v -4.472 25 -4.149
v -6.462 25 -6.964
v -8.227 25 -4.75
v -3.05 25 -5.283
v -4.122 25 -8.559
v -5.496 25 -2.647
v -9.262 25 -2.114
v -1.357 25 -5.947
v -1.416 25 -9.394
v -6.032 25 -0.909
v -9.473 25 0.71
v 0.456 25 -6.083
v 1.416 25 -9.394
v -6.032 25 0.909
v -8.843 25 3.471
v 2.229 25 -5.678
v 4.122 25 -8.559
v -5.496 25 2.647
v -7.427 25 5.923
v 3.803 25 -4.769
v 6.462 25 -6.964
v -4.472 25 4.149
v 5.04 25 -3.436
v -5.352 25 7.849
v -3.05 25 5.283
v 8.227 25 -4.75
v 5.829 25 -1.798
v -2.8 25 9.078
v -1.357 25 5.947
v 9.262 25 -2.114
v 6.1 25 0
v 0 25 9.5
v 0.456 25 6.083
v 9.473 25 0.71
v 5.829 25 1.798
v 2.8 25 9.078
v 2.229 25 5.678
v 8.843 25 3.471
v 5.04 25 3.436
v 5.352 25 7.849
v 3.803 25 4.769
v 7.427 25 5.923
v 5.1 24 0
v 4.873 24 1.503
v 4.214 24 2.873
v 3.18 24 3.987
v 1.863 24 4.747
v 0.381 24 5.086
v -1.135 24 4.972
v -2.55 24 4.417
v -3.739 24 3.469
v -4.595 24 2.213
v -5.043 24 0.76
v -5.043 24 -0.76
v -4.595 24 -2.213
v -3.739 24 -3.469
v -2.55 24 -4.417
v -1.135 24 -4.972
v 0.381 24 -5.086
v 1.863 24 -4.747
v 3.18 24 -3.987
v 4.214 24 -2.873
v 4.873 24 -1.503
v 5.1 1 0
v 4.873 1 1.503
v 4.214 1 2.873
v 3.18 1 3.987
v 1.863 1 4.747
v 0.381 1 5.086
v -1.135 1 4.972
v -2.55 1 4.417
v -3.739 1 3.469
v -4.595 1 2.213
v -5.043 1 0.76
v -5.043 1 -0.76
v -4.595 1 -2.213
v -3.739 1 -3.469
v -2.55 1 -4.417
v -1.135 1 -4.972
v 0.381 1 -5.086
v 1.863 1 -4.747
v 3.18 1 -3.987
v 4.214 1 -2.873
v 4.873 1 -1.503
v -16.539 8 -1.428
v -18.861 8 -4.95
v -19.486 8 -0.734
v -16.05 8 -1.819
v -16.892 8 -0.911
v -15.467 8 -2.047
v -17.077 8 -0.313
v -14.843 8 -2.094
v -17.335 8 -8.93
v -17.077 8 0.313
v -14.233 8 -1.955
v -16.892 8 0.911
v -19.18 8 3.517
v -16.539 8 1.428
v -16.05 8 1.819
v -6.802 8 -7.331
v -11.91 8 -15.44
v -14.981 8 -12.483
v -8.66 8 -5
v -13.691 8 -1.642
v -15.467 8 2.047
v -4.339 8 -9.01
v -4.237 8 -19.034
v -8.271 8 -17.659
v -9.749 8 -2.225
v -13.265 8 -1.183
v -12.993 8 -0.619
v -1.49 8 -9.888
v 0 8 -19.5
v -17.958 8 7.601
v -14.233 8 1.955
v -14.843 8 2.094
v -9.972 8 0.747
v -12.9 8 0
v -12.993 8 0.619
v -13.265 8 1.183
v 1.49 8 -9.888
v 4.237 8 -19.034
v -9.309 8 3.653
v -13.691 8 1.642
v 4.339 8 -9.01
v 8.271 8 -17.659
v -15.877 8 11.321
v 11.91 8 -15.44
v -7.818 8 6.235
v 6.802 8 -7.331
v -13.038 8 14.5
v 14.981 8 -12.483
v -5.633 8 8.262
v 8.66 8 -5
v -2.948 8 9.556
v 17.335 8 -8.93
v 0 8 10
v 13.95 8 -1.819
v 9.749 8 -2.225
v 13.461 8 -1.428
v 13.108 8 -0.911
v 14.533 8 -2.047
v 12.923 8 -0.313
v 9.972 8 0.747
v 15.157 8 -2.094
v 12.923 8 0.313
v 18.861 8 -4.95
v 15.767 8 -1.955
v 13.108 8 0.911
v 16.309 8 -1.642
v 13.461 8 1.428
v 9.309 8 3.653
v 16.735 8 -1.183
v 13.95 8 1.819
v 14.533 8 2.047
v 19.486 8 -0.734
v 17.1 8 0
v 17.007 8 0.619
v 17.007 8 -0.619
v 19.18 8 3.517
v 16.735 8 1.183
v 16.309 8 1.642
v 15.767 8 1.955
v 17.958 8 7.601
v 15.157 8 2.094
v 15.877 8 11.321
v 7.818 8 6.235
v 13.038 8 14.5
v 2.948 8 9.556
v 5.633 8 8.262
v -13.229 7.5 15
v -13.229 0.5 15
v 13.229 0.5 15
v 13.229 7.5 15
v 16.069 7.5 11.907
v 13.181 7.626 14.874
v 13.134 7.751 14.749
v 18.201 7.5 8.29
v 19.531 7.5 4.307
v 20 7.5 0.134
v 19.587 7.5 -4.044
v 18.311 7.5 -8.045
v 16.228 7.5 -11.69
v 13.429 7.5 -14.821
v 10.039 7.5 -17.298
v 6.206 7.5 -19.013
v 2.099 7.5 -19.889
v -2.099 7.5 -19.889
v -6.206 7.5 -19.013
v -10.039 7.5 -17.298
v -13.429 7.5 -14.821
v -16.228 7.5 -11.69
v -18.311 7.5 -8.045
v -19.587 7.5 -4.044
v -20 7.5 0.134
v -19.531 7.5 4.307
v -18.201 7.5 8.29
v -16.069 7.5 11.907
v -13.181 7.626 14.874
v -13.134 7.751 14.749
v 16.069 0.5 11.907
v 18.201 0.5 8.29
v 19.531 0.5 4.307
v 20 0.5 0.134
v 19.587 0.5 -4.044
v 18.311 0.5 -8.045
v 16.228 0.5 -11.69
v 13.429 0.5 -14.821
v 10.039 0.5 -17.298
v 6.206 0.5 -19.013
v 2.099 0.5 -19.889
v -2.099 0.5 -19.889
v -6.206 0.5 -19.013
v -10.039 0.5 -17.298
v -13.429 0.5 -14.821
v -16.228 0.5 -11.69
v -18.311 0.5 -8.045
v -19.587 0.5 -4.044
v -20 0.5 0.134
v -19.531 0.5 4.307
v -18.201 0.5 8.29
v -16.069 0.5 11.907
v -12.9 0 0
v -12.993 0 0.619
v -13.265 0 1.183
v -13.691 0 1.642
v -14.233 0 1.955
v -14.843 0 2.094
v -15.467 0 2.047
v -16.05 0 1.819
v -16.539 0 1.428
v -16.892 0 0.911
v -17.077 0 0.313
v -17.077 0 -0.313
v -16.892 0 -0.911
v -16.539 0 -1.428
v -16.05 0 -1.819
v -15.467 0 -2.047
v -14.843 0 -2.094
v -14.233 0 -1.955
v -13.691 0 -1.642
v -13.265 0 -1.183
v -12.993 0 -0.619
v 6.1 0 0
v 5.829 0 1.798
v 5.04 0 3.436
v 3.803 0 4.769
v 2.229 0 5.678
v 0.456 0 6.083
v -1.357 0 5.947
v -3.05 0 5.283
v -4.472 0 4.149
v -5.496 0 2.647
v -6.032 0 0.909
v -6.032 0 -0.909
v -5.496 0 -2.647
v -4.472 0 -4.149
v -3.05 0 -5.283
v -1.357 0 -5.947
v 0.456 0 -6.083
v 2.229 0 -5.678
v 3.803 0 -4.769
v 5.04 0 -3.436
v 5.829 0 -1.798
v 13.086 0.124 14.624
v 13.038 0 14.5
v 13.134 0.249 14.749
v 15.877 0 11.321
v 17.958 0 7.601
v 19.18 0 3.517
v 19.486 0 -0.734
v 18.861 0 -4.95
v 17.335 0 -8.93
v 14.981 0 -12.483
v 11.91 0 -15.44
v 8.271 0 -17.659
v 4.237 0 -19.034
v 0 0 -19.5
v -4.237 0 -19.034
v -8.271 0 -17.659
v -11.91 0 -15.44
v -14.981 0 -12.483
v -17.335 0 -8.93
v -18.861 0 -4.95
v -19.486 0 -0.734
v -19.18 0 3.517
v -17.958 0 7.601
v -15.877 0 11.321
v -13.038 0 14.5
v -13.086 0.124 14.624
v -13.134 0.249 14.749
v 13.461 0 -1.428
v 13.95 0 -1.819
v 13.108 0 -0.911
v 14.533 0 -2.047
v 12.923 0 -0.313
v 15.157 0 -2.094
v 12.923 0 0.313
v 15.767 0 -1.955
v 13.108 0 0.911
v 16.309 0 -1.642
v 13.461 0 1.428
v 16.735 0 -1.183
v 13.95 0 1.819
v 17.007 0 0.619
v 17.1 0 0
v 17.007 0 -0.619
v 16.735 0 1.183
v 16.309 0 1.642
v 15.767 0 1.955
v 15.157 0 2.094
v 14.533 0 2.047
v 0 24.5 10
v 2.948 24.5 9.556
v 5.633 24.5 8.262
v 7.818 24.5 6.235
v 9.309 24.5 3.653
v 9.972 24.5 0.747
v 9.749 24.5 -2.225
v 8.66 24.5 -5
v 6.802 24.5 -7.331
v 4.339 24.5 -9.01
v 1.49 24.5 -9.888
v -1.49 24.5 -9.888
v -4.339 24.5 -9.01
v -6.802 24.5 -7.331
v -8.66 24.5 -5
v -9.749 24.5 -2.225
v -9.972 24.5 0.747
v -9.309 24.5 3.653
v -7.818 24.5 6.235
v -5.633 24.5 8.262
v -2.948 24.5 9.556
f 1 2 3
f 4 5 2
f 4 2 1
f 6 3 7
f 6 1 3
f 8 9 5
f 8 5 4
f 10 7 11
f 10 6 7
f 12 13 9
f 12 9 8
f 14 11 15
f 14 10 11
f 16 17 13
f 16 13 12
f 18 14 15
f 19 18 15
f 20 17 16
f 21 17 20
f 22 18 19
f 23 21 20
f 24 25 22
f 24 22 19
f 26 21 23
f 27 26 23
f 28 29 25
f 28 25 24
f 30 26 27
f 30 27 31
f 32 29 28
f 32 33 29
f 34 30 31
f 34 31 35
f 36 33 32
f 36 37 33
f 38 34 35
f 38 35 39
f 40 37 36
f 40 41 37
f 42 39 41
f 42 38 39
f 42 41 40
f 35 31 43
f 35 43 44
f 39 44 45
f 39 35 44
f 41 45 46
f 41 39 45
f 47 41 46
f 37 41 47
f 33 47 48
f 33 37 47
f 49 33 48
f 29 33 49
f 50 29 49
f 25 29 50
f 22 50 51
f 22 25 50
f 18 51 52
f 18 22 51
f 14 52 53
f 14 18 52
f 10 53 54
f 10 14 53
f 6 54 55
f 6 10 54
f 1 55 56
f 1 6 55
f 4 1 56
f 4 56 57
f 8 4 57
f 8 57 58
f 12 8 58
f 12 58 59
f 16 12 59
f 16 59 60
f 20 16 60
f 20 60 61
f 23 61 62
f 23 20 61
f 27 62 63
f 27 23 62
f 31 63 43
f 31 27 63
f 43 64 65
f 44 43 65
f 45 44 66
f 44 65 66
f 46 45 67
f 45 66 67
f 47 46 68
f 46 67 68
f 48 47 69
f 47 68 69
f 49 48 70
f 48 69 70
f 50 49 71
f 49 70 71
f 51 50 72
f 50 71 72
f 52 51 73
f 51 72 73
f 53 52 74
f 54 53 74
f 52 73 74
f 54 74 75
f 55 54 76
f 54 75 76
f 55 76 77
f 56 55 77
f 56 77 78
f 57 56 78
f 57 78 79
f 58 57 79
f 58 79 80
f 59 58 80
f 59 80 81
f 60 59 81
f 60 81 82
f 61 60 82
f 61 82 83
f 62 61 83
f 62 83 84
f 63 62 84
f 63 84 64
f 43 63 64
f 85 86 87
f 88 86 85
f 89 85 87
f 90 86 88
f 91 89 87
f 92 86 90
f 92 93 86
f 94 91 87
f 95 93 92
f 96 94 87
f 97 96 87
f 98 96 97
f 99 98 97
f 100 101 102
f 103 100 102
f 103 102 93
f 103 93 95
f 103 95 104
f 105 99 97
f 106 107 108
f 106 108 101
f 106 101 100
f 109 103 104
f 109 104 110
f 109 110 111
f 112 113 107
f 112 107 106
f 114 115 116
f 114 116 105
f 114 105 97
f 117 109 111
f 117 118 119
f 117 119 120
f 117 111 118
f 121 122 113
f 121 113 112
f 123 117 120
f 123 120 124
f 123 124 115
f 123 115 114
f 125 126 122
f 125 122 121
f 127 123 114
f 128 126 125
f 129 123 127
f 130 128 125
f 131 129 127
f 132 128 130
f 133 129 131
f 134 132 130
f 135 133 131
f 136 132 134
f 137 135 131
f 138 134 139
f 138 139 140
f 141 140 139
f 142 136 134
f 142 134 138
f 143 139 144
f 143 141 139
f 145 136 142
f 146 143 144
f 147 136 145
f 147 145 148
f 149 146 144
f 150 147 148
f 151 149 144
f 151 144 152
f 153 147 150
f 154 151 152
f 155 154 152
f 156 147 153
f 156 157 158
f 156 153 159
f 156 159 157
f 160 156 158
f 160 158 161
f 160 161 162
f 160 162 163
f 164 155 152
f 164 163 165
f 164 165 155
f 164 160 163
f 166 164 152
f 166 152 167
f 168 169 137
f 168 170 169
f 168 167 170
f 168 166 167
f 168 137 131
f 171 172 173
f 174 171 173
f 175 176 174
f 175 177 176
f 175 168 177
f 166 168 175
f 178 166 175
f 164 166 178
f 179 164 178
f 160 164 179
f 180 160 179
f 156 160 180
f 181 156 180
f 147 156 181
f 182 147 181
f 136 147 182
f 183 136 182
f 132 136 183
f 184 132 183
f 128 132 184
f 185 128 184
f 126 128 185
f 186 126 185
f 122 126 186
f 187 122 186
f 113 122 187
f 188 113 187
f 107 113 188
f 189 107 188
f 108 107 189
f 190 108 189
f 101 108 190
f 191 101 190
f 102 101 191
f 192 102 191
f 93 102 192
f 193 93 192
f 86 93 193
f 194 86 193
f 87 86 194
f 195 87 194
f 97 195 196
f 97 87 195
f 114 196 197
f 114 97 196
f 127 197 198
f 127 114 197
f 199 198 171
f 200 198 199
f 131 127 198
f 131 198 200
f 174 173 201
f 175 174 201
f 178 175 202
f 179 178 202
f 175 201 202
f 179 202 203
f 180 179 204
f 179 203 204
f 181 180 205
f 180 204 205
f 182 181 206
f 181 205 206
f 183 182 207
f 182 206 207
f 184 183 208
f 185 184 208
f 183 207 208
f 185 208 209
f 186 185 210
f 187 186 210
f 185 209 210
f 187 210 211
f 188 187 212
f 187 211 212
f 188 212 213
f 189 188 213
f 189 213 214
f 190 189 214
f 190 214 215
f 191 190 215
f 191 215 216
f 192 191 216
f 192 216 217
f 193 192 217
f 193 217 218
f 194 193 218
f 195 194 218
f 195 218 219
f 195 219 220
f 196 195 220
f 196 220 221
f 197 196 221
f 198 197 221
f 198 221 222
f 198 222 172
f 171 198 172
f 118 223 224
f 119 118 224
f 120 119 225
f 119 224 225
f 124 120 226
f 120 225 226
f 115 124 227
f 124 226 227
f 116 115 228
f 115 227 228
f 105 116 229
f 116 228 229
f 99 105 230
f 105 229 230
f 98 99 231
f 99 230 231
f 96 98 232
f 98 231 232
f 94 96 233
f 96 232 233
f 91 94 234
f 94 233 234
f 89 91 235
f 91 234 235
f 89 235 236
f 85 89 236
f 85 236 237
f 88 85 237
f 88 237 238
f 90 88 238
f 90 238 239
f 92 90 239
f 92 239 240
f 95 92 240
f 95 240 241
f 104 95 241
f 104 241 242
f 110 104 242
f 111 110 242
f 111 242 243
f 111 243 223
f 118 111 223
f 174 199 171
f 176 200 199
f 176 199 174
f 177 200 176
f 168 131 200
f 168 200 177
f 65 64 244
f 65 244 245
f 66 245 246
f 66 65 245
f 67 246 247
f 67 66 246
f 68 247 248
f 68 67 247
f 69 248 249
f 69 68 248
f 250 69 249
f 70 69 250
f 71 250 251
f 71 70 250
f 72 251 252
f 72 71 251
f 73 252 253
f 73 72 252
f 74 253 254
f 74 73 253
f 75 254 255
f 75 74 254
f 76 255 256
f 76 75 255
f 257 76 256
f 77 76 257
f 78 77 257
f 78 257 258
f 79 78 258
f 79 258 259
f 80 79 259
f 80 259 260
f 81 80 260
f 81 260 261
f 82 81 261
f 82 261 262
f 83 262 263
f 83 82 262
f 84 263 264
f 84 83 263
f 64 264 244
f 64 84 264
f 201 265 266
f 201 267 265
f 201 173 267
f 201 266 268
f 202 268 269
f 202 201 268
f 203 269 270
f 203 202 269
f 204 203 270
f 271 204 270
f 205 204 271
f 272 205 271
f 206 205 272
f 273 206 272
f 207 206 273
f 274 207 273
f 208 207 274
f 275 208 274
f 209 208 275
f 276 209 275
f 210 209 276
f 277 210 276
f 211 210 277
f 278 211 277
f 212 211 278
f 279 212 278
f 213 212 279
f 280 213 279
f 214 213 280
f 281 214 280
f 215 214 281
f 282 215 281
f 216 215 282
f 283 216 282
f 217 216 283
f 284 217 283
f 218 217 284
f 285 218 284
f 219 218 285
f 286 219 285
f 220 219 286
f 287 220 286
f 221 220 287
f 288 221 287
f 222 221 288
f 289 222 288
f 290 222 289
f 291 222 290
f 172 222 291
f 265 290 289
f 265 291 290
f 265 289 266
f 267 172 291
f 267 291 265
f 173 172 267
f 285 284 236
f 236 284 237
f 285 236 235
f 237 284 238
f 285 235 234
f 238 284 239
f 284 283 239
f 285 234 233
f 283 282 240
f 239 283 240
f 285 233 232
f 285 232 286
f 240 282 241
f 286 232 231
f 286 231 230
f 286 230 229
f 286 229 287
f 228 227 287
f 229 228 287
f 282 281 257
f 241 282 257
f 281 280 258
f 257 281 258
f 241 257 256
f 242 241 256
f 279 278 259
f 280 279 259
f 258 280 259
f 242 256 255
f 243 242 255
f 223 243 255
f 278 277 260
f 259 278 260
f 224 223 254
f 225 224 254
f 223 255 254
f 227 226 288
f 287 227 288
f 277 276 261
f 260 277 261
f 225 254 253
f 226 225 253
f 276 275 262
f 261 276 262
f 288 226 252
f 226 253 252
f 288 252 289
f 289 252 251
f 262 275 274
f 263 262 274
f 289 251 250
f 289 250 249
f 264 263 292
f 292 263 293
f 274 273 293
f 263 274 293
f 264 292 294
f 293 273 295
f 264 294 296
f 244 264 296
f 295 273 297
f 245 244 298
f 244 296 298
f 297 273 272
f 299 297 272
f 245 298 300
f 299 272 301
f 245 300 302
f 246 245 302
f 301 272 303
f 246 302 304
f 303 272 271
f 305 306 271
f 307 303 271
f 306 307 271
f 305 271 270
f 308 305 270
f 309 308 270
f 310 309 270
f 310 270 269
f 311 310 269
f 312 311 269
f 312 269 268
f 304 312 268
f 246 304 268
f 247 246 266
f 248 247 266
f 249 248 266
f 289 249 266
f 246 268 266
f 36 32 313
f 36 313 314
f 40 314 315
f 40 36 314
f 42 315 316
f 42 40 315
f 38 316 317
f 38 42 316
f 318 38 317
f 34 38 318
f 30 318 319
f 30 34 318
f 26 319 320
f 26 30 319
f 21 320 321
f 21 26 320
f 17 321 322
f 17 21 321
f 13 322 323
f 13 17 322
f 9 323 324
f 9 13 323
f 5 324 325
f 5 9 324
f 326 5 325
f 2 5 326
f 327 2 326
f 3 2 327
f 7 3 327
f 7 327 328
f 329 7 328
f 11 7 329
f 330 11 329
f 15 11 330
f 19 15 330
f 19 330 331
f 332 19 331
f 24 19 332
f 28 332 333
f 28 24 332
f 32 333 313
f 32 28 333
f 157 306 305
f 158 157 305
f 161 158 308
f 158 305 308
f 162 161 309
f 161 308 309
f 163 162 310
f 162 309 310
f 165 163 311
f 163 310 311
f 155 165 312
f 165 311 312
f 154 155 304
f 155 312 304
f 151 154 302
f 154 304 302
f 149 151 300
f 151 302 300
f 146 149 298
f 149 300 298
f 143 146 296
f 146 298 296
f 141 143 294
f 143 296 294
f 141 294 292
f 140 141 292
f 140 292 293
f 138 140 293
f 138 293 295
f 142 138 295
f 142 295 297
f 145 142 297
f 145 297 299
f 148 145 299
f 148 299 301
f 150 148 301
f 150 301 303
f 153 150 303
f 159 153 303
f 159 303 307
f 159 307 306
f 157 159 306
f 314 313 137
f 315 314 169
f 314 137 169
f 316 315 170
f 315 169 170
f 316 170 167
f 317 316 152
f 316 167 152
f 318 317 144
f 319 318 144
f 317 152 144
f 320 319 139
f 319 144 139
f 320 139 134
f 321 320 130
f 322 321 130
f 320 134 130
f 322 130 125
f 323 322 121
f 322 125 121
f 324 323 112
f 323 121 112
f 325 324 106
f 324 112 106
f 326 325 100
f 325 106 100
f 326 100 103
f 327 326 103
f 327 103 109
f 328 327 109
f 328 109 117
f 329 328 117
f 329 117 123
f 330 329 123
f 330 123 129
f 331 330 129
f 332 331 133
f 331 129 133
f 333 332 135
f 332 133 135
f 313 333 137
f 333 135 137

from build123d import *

# Parameters (mm, degrees)
SKETCH1_R           = 20
BOSS_EXTRUDE1_DEPTH = 8
SKETCH2_R           = 10
BOSS_EXTRUDE2_DEPTH = 17
M12_TAPPED_HOLE1_D  = 10.2
CHAMFER1_SIZE       = 1
M5_TAPPED_HOLE1_D   = 4.2
CUT_EXTRUDE1_REACH  = 39.749
SKETCH7_W           = 49.327328333
SKETCH7_H           = 13.526029649
CHAMFER2_SIZE       = 0.5


with BuildPart() as part:
    # Sketch1 → Boss-Extrude1 (new body)
    with BuildSketch(Plane(origin=(0, 0, 0), x_dir=(1, 0, 0), z_dir=(0, 1, 0))):
        with Locations(Location((0, 0, 0), (0, 0, 270))):
            Circle(SKETCH1_R)
    extrude(amount=BOSS_EXTRUDE1_DEPTH)

    # Sketch2 → Boss-Extrude2 (add)
    with BuildSketch(Plane(origin=(0, 8, 0), x_dir=(1, 0, 0), z_dir=(0, 1, 0))):
        with Locations(Location((0, 0, 0), (0, 0, 270))):
            Circle(SKETCH2_R)
    extrude(amount=BOSS_EXTRUDE2_DEPTH)

    # M12 Tapped Hole1 (through all)
    with Locations(Plane(origin=(0, 25, 0), x_dir=(-1, 0, 0), z_dir=(0, 1, 0))):
        with Locations((0, 0)):
            Hole(M12_TAPPED_HOLE1_D / 2)

    # Chamfer1
    chamfer1_edges = [part.edges().sort_by_distance(p)[0] for p in [
        (-5.1, 25, 0),
        (-5.1, 0, 0),
    ]]
    chamfer(chamfer1_edges, length=CHAMFER1_SIZE)

    # M5 Tapped Hole1 (through all)
    with Locations(Plane(origin=(0, 8, 0), x_dir=(-1, 0, 0), z_dir=(0, 1, 0))):
        with Locations((15, 0), (-15, 0)):
            Hole(M5_TAPPED_HOLE1_D / 2)

    # Sketch7 → Cut-Extrude1 (cut, up to next)
    with BuildSketch(Plane.XZ, mode=Mode.PRIVATE) as cut_extrude1_sk1:
        with Locations((2.087303486, 21.763014825)):
            Rectangle(SKETCH7_W, SKETCH7_H)
    cut_extrude1_tool1 = extrude(cut_extrude1_sk1.sketch, amount=-CUT_EXTRUDE1_REACH, mode=Mode.PRIVATE) & part.part
    add(cut_extrude1_tool1.solids().sort_by_distance((2.087303, 0, 21.763015))[0], mode=Mode.SUBTRACT)

    # Chamfer2
    chamfer2_edges = [part.edges().sort_by_distance(p)[0] for p in [
        (0, 0, -20),
        (0, 8, 15),
        (0, 0, 15),
        (0, 8, -20),
        (0, 25, -10),
    ]]
    chamfer(chamfer2_edges, length=CHAMFER2_SIZE)


solid = part.part
